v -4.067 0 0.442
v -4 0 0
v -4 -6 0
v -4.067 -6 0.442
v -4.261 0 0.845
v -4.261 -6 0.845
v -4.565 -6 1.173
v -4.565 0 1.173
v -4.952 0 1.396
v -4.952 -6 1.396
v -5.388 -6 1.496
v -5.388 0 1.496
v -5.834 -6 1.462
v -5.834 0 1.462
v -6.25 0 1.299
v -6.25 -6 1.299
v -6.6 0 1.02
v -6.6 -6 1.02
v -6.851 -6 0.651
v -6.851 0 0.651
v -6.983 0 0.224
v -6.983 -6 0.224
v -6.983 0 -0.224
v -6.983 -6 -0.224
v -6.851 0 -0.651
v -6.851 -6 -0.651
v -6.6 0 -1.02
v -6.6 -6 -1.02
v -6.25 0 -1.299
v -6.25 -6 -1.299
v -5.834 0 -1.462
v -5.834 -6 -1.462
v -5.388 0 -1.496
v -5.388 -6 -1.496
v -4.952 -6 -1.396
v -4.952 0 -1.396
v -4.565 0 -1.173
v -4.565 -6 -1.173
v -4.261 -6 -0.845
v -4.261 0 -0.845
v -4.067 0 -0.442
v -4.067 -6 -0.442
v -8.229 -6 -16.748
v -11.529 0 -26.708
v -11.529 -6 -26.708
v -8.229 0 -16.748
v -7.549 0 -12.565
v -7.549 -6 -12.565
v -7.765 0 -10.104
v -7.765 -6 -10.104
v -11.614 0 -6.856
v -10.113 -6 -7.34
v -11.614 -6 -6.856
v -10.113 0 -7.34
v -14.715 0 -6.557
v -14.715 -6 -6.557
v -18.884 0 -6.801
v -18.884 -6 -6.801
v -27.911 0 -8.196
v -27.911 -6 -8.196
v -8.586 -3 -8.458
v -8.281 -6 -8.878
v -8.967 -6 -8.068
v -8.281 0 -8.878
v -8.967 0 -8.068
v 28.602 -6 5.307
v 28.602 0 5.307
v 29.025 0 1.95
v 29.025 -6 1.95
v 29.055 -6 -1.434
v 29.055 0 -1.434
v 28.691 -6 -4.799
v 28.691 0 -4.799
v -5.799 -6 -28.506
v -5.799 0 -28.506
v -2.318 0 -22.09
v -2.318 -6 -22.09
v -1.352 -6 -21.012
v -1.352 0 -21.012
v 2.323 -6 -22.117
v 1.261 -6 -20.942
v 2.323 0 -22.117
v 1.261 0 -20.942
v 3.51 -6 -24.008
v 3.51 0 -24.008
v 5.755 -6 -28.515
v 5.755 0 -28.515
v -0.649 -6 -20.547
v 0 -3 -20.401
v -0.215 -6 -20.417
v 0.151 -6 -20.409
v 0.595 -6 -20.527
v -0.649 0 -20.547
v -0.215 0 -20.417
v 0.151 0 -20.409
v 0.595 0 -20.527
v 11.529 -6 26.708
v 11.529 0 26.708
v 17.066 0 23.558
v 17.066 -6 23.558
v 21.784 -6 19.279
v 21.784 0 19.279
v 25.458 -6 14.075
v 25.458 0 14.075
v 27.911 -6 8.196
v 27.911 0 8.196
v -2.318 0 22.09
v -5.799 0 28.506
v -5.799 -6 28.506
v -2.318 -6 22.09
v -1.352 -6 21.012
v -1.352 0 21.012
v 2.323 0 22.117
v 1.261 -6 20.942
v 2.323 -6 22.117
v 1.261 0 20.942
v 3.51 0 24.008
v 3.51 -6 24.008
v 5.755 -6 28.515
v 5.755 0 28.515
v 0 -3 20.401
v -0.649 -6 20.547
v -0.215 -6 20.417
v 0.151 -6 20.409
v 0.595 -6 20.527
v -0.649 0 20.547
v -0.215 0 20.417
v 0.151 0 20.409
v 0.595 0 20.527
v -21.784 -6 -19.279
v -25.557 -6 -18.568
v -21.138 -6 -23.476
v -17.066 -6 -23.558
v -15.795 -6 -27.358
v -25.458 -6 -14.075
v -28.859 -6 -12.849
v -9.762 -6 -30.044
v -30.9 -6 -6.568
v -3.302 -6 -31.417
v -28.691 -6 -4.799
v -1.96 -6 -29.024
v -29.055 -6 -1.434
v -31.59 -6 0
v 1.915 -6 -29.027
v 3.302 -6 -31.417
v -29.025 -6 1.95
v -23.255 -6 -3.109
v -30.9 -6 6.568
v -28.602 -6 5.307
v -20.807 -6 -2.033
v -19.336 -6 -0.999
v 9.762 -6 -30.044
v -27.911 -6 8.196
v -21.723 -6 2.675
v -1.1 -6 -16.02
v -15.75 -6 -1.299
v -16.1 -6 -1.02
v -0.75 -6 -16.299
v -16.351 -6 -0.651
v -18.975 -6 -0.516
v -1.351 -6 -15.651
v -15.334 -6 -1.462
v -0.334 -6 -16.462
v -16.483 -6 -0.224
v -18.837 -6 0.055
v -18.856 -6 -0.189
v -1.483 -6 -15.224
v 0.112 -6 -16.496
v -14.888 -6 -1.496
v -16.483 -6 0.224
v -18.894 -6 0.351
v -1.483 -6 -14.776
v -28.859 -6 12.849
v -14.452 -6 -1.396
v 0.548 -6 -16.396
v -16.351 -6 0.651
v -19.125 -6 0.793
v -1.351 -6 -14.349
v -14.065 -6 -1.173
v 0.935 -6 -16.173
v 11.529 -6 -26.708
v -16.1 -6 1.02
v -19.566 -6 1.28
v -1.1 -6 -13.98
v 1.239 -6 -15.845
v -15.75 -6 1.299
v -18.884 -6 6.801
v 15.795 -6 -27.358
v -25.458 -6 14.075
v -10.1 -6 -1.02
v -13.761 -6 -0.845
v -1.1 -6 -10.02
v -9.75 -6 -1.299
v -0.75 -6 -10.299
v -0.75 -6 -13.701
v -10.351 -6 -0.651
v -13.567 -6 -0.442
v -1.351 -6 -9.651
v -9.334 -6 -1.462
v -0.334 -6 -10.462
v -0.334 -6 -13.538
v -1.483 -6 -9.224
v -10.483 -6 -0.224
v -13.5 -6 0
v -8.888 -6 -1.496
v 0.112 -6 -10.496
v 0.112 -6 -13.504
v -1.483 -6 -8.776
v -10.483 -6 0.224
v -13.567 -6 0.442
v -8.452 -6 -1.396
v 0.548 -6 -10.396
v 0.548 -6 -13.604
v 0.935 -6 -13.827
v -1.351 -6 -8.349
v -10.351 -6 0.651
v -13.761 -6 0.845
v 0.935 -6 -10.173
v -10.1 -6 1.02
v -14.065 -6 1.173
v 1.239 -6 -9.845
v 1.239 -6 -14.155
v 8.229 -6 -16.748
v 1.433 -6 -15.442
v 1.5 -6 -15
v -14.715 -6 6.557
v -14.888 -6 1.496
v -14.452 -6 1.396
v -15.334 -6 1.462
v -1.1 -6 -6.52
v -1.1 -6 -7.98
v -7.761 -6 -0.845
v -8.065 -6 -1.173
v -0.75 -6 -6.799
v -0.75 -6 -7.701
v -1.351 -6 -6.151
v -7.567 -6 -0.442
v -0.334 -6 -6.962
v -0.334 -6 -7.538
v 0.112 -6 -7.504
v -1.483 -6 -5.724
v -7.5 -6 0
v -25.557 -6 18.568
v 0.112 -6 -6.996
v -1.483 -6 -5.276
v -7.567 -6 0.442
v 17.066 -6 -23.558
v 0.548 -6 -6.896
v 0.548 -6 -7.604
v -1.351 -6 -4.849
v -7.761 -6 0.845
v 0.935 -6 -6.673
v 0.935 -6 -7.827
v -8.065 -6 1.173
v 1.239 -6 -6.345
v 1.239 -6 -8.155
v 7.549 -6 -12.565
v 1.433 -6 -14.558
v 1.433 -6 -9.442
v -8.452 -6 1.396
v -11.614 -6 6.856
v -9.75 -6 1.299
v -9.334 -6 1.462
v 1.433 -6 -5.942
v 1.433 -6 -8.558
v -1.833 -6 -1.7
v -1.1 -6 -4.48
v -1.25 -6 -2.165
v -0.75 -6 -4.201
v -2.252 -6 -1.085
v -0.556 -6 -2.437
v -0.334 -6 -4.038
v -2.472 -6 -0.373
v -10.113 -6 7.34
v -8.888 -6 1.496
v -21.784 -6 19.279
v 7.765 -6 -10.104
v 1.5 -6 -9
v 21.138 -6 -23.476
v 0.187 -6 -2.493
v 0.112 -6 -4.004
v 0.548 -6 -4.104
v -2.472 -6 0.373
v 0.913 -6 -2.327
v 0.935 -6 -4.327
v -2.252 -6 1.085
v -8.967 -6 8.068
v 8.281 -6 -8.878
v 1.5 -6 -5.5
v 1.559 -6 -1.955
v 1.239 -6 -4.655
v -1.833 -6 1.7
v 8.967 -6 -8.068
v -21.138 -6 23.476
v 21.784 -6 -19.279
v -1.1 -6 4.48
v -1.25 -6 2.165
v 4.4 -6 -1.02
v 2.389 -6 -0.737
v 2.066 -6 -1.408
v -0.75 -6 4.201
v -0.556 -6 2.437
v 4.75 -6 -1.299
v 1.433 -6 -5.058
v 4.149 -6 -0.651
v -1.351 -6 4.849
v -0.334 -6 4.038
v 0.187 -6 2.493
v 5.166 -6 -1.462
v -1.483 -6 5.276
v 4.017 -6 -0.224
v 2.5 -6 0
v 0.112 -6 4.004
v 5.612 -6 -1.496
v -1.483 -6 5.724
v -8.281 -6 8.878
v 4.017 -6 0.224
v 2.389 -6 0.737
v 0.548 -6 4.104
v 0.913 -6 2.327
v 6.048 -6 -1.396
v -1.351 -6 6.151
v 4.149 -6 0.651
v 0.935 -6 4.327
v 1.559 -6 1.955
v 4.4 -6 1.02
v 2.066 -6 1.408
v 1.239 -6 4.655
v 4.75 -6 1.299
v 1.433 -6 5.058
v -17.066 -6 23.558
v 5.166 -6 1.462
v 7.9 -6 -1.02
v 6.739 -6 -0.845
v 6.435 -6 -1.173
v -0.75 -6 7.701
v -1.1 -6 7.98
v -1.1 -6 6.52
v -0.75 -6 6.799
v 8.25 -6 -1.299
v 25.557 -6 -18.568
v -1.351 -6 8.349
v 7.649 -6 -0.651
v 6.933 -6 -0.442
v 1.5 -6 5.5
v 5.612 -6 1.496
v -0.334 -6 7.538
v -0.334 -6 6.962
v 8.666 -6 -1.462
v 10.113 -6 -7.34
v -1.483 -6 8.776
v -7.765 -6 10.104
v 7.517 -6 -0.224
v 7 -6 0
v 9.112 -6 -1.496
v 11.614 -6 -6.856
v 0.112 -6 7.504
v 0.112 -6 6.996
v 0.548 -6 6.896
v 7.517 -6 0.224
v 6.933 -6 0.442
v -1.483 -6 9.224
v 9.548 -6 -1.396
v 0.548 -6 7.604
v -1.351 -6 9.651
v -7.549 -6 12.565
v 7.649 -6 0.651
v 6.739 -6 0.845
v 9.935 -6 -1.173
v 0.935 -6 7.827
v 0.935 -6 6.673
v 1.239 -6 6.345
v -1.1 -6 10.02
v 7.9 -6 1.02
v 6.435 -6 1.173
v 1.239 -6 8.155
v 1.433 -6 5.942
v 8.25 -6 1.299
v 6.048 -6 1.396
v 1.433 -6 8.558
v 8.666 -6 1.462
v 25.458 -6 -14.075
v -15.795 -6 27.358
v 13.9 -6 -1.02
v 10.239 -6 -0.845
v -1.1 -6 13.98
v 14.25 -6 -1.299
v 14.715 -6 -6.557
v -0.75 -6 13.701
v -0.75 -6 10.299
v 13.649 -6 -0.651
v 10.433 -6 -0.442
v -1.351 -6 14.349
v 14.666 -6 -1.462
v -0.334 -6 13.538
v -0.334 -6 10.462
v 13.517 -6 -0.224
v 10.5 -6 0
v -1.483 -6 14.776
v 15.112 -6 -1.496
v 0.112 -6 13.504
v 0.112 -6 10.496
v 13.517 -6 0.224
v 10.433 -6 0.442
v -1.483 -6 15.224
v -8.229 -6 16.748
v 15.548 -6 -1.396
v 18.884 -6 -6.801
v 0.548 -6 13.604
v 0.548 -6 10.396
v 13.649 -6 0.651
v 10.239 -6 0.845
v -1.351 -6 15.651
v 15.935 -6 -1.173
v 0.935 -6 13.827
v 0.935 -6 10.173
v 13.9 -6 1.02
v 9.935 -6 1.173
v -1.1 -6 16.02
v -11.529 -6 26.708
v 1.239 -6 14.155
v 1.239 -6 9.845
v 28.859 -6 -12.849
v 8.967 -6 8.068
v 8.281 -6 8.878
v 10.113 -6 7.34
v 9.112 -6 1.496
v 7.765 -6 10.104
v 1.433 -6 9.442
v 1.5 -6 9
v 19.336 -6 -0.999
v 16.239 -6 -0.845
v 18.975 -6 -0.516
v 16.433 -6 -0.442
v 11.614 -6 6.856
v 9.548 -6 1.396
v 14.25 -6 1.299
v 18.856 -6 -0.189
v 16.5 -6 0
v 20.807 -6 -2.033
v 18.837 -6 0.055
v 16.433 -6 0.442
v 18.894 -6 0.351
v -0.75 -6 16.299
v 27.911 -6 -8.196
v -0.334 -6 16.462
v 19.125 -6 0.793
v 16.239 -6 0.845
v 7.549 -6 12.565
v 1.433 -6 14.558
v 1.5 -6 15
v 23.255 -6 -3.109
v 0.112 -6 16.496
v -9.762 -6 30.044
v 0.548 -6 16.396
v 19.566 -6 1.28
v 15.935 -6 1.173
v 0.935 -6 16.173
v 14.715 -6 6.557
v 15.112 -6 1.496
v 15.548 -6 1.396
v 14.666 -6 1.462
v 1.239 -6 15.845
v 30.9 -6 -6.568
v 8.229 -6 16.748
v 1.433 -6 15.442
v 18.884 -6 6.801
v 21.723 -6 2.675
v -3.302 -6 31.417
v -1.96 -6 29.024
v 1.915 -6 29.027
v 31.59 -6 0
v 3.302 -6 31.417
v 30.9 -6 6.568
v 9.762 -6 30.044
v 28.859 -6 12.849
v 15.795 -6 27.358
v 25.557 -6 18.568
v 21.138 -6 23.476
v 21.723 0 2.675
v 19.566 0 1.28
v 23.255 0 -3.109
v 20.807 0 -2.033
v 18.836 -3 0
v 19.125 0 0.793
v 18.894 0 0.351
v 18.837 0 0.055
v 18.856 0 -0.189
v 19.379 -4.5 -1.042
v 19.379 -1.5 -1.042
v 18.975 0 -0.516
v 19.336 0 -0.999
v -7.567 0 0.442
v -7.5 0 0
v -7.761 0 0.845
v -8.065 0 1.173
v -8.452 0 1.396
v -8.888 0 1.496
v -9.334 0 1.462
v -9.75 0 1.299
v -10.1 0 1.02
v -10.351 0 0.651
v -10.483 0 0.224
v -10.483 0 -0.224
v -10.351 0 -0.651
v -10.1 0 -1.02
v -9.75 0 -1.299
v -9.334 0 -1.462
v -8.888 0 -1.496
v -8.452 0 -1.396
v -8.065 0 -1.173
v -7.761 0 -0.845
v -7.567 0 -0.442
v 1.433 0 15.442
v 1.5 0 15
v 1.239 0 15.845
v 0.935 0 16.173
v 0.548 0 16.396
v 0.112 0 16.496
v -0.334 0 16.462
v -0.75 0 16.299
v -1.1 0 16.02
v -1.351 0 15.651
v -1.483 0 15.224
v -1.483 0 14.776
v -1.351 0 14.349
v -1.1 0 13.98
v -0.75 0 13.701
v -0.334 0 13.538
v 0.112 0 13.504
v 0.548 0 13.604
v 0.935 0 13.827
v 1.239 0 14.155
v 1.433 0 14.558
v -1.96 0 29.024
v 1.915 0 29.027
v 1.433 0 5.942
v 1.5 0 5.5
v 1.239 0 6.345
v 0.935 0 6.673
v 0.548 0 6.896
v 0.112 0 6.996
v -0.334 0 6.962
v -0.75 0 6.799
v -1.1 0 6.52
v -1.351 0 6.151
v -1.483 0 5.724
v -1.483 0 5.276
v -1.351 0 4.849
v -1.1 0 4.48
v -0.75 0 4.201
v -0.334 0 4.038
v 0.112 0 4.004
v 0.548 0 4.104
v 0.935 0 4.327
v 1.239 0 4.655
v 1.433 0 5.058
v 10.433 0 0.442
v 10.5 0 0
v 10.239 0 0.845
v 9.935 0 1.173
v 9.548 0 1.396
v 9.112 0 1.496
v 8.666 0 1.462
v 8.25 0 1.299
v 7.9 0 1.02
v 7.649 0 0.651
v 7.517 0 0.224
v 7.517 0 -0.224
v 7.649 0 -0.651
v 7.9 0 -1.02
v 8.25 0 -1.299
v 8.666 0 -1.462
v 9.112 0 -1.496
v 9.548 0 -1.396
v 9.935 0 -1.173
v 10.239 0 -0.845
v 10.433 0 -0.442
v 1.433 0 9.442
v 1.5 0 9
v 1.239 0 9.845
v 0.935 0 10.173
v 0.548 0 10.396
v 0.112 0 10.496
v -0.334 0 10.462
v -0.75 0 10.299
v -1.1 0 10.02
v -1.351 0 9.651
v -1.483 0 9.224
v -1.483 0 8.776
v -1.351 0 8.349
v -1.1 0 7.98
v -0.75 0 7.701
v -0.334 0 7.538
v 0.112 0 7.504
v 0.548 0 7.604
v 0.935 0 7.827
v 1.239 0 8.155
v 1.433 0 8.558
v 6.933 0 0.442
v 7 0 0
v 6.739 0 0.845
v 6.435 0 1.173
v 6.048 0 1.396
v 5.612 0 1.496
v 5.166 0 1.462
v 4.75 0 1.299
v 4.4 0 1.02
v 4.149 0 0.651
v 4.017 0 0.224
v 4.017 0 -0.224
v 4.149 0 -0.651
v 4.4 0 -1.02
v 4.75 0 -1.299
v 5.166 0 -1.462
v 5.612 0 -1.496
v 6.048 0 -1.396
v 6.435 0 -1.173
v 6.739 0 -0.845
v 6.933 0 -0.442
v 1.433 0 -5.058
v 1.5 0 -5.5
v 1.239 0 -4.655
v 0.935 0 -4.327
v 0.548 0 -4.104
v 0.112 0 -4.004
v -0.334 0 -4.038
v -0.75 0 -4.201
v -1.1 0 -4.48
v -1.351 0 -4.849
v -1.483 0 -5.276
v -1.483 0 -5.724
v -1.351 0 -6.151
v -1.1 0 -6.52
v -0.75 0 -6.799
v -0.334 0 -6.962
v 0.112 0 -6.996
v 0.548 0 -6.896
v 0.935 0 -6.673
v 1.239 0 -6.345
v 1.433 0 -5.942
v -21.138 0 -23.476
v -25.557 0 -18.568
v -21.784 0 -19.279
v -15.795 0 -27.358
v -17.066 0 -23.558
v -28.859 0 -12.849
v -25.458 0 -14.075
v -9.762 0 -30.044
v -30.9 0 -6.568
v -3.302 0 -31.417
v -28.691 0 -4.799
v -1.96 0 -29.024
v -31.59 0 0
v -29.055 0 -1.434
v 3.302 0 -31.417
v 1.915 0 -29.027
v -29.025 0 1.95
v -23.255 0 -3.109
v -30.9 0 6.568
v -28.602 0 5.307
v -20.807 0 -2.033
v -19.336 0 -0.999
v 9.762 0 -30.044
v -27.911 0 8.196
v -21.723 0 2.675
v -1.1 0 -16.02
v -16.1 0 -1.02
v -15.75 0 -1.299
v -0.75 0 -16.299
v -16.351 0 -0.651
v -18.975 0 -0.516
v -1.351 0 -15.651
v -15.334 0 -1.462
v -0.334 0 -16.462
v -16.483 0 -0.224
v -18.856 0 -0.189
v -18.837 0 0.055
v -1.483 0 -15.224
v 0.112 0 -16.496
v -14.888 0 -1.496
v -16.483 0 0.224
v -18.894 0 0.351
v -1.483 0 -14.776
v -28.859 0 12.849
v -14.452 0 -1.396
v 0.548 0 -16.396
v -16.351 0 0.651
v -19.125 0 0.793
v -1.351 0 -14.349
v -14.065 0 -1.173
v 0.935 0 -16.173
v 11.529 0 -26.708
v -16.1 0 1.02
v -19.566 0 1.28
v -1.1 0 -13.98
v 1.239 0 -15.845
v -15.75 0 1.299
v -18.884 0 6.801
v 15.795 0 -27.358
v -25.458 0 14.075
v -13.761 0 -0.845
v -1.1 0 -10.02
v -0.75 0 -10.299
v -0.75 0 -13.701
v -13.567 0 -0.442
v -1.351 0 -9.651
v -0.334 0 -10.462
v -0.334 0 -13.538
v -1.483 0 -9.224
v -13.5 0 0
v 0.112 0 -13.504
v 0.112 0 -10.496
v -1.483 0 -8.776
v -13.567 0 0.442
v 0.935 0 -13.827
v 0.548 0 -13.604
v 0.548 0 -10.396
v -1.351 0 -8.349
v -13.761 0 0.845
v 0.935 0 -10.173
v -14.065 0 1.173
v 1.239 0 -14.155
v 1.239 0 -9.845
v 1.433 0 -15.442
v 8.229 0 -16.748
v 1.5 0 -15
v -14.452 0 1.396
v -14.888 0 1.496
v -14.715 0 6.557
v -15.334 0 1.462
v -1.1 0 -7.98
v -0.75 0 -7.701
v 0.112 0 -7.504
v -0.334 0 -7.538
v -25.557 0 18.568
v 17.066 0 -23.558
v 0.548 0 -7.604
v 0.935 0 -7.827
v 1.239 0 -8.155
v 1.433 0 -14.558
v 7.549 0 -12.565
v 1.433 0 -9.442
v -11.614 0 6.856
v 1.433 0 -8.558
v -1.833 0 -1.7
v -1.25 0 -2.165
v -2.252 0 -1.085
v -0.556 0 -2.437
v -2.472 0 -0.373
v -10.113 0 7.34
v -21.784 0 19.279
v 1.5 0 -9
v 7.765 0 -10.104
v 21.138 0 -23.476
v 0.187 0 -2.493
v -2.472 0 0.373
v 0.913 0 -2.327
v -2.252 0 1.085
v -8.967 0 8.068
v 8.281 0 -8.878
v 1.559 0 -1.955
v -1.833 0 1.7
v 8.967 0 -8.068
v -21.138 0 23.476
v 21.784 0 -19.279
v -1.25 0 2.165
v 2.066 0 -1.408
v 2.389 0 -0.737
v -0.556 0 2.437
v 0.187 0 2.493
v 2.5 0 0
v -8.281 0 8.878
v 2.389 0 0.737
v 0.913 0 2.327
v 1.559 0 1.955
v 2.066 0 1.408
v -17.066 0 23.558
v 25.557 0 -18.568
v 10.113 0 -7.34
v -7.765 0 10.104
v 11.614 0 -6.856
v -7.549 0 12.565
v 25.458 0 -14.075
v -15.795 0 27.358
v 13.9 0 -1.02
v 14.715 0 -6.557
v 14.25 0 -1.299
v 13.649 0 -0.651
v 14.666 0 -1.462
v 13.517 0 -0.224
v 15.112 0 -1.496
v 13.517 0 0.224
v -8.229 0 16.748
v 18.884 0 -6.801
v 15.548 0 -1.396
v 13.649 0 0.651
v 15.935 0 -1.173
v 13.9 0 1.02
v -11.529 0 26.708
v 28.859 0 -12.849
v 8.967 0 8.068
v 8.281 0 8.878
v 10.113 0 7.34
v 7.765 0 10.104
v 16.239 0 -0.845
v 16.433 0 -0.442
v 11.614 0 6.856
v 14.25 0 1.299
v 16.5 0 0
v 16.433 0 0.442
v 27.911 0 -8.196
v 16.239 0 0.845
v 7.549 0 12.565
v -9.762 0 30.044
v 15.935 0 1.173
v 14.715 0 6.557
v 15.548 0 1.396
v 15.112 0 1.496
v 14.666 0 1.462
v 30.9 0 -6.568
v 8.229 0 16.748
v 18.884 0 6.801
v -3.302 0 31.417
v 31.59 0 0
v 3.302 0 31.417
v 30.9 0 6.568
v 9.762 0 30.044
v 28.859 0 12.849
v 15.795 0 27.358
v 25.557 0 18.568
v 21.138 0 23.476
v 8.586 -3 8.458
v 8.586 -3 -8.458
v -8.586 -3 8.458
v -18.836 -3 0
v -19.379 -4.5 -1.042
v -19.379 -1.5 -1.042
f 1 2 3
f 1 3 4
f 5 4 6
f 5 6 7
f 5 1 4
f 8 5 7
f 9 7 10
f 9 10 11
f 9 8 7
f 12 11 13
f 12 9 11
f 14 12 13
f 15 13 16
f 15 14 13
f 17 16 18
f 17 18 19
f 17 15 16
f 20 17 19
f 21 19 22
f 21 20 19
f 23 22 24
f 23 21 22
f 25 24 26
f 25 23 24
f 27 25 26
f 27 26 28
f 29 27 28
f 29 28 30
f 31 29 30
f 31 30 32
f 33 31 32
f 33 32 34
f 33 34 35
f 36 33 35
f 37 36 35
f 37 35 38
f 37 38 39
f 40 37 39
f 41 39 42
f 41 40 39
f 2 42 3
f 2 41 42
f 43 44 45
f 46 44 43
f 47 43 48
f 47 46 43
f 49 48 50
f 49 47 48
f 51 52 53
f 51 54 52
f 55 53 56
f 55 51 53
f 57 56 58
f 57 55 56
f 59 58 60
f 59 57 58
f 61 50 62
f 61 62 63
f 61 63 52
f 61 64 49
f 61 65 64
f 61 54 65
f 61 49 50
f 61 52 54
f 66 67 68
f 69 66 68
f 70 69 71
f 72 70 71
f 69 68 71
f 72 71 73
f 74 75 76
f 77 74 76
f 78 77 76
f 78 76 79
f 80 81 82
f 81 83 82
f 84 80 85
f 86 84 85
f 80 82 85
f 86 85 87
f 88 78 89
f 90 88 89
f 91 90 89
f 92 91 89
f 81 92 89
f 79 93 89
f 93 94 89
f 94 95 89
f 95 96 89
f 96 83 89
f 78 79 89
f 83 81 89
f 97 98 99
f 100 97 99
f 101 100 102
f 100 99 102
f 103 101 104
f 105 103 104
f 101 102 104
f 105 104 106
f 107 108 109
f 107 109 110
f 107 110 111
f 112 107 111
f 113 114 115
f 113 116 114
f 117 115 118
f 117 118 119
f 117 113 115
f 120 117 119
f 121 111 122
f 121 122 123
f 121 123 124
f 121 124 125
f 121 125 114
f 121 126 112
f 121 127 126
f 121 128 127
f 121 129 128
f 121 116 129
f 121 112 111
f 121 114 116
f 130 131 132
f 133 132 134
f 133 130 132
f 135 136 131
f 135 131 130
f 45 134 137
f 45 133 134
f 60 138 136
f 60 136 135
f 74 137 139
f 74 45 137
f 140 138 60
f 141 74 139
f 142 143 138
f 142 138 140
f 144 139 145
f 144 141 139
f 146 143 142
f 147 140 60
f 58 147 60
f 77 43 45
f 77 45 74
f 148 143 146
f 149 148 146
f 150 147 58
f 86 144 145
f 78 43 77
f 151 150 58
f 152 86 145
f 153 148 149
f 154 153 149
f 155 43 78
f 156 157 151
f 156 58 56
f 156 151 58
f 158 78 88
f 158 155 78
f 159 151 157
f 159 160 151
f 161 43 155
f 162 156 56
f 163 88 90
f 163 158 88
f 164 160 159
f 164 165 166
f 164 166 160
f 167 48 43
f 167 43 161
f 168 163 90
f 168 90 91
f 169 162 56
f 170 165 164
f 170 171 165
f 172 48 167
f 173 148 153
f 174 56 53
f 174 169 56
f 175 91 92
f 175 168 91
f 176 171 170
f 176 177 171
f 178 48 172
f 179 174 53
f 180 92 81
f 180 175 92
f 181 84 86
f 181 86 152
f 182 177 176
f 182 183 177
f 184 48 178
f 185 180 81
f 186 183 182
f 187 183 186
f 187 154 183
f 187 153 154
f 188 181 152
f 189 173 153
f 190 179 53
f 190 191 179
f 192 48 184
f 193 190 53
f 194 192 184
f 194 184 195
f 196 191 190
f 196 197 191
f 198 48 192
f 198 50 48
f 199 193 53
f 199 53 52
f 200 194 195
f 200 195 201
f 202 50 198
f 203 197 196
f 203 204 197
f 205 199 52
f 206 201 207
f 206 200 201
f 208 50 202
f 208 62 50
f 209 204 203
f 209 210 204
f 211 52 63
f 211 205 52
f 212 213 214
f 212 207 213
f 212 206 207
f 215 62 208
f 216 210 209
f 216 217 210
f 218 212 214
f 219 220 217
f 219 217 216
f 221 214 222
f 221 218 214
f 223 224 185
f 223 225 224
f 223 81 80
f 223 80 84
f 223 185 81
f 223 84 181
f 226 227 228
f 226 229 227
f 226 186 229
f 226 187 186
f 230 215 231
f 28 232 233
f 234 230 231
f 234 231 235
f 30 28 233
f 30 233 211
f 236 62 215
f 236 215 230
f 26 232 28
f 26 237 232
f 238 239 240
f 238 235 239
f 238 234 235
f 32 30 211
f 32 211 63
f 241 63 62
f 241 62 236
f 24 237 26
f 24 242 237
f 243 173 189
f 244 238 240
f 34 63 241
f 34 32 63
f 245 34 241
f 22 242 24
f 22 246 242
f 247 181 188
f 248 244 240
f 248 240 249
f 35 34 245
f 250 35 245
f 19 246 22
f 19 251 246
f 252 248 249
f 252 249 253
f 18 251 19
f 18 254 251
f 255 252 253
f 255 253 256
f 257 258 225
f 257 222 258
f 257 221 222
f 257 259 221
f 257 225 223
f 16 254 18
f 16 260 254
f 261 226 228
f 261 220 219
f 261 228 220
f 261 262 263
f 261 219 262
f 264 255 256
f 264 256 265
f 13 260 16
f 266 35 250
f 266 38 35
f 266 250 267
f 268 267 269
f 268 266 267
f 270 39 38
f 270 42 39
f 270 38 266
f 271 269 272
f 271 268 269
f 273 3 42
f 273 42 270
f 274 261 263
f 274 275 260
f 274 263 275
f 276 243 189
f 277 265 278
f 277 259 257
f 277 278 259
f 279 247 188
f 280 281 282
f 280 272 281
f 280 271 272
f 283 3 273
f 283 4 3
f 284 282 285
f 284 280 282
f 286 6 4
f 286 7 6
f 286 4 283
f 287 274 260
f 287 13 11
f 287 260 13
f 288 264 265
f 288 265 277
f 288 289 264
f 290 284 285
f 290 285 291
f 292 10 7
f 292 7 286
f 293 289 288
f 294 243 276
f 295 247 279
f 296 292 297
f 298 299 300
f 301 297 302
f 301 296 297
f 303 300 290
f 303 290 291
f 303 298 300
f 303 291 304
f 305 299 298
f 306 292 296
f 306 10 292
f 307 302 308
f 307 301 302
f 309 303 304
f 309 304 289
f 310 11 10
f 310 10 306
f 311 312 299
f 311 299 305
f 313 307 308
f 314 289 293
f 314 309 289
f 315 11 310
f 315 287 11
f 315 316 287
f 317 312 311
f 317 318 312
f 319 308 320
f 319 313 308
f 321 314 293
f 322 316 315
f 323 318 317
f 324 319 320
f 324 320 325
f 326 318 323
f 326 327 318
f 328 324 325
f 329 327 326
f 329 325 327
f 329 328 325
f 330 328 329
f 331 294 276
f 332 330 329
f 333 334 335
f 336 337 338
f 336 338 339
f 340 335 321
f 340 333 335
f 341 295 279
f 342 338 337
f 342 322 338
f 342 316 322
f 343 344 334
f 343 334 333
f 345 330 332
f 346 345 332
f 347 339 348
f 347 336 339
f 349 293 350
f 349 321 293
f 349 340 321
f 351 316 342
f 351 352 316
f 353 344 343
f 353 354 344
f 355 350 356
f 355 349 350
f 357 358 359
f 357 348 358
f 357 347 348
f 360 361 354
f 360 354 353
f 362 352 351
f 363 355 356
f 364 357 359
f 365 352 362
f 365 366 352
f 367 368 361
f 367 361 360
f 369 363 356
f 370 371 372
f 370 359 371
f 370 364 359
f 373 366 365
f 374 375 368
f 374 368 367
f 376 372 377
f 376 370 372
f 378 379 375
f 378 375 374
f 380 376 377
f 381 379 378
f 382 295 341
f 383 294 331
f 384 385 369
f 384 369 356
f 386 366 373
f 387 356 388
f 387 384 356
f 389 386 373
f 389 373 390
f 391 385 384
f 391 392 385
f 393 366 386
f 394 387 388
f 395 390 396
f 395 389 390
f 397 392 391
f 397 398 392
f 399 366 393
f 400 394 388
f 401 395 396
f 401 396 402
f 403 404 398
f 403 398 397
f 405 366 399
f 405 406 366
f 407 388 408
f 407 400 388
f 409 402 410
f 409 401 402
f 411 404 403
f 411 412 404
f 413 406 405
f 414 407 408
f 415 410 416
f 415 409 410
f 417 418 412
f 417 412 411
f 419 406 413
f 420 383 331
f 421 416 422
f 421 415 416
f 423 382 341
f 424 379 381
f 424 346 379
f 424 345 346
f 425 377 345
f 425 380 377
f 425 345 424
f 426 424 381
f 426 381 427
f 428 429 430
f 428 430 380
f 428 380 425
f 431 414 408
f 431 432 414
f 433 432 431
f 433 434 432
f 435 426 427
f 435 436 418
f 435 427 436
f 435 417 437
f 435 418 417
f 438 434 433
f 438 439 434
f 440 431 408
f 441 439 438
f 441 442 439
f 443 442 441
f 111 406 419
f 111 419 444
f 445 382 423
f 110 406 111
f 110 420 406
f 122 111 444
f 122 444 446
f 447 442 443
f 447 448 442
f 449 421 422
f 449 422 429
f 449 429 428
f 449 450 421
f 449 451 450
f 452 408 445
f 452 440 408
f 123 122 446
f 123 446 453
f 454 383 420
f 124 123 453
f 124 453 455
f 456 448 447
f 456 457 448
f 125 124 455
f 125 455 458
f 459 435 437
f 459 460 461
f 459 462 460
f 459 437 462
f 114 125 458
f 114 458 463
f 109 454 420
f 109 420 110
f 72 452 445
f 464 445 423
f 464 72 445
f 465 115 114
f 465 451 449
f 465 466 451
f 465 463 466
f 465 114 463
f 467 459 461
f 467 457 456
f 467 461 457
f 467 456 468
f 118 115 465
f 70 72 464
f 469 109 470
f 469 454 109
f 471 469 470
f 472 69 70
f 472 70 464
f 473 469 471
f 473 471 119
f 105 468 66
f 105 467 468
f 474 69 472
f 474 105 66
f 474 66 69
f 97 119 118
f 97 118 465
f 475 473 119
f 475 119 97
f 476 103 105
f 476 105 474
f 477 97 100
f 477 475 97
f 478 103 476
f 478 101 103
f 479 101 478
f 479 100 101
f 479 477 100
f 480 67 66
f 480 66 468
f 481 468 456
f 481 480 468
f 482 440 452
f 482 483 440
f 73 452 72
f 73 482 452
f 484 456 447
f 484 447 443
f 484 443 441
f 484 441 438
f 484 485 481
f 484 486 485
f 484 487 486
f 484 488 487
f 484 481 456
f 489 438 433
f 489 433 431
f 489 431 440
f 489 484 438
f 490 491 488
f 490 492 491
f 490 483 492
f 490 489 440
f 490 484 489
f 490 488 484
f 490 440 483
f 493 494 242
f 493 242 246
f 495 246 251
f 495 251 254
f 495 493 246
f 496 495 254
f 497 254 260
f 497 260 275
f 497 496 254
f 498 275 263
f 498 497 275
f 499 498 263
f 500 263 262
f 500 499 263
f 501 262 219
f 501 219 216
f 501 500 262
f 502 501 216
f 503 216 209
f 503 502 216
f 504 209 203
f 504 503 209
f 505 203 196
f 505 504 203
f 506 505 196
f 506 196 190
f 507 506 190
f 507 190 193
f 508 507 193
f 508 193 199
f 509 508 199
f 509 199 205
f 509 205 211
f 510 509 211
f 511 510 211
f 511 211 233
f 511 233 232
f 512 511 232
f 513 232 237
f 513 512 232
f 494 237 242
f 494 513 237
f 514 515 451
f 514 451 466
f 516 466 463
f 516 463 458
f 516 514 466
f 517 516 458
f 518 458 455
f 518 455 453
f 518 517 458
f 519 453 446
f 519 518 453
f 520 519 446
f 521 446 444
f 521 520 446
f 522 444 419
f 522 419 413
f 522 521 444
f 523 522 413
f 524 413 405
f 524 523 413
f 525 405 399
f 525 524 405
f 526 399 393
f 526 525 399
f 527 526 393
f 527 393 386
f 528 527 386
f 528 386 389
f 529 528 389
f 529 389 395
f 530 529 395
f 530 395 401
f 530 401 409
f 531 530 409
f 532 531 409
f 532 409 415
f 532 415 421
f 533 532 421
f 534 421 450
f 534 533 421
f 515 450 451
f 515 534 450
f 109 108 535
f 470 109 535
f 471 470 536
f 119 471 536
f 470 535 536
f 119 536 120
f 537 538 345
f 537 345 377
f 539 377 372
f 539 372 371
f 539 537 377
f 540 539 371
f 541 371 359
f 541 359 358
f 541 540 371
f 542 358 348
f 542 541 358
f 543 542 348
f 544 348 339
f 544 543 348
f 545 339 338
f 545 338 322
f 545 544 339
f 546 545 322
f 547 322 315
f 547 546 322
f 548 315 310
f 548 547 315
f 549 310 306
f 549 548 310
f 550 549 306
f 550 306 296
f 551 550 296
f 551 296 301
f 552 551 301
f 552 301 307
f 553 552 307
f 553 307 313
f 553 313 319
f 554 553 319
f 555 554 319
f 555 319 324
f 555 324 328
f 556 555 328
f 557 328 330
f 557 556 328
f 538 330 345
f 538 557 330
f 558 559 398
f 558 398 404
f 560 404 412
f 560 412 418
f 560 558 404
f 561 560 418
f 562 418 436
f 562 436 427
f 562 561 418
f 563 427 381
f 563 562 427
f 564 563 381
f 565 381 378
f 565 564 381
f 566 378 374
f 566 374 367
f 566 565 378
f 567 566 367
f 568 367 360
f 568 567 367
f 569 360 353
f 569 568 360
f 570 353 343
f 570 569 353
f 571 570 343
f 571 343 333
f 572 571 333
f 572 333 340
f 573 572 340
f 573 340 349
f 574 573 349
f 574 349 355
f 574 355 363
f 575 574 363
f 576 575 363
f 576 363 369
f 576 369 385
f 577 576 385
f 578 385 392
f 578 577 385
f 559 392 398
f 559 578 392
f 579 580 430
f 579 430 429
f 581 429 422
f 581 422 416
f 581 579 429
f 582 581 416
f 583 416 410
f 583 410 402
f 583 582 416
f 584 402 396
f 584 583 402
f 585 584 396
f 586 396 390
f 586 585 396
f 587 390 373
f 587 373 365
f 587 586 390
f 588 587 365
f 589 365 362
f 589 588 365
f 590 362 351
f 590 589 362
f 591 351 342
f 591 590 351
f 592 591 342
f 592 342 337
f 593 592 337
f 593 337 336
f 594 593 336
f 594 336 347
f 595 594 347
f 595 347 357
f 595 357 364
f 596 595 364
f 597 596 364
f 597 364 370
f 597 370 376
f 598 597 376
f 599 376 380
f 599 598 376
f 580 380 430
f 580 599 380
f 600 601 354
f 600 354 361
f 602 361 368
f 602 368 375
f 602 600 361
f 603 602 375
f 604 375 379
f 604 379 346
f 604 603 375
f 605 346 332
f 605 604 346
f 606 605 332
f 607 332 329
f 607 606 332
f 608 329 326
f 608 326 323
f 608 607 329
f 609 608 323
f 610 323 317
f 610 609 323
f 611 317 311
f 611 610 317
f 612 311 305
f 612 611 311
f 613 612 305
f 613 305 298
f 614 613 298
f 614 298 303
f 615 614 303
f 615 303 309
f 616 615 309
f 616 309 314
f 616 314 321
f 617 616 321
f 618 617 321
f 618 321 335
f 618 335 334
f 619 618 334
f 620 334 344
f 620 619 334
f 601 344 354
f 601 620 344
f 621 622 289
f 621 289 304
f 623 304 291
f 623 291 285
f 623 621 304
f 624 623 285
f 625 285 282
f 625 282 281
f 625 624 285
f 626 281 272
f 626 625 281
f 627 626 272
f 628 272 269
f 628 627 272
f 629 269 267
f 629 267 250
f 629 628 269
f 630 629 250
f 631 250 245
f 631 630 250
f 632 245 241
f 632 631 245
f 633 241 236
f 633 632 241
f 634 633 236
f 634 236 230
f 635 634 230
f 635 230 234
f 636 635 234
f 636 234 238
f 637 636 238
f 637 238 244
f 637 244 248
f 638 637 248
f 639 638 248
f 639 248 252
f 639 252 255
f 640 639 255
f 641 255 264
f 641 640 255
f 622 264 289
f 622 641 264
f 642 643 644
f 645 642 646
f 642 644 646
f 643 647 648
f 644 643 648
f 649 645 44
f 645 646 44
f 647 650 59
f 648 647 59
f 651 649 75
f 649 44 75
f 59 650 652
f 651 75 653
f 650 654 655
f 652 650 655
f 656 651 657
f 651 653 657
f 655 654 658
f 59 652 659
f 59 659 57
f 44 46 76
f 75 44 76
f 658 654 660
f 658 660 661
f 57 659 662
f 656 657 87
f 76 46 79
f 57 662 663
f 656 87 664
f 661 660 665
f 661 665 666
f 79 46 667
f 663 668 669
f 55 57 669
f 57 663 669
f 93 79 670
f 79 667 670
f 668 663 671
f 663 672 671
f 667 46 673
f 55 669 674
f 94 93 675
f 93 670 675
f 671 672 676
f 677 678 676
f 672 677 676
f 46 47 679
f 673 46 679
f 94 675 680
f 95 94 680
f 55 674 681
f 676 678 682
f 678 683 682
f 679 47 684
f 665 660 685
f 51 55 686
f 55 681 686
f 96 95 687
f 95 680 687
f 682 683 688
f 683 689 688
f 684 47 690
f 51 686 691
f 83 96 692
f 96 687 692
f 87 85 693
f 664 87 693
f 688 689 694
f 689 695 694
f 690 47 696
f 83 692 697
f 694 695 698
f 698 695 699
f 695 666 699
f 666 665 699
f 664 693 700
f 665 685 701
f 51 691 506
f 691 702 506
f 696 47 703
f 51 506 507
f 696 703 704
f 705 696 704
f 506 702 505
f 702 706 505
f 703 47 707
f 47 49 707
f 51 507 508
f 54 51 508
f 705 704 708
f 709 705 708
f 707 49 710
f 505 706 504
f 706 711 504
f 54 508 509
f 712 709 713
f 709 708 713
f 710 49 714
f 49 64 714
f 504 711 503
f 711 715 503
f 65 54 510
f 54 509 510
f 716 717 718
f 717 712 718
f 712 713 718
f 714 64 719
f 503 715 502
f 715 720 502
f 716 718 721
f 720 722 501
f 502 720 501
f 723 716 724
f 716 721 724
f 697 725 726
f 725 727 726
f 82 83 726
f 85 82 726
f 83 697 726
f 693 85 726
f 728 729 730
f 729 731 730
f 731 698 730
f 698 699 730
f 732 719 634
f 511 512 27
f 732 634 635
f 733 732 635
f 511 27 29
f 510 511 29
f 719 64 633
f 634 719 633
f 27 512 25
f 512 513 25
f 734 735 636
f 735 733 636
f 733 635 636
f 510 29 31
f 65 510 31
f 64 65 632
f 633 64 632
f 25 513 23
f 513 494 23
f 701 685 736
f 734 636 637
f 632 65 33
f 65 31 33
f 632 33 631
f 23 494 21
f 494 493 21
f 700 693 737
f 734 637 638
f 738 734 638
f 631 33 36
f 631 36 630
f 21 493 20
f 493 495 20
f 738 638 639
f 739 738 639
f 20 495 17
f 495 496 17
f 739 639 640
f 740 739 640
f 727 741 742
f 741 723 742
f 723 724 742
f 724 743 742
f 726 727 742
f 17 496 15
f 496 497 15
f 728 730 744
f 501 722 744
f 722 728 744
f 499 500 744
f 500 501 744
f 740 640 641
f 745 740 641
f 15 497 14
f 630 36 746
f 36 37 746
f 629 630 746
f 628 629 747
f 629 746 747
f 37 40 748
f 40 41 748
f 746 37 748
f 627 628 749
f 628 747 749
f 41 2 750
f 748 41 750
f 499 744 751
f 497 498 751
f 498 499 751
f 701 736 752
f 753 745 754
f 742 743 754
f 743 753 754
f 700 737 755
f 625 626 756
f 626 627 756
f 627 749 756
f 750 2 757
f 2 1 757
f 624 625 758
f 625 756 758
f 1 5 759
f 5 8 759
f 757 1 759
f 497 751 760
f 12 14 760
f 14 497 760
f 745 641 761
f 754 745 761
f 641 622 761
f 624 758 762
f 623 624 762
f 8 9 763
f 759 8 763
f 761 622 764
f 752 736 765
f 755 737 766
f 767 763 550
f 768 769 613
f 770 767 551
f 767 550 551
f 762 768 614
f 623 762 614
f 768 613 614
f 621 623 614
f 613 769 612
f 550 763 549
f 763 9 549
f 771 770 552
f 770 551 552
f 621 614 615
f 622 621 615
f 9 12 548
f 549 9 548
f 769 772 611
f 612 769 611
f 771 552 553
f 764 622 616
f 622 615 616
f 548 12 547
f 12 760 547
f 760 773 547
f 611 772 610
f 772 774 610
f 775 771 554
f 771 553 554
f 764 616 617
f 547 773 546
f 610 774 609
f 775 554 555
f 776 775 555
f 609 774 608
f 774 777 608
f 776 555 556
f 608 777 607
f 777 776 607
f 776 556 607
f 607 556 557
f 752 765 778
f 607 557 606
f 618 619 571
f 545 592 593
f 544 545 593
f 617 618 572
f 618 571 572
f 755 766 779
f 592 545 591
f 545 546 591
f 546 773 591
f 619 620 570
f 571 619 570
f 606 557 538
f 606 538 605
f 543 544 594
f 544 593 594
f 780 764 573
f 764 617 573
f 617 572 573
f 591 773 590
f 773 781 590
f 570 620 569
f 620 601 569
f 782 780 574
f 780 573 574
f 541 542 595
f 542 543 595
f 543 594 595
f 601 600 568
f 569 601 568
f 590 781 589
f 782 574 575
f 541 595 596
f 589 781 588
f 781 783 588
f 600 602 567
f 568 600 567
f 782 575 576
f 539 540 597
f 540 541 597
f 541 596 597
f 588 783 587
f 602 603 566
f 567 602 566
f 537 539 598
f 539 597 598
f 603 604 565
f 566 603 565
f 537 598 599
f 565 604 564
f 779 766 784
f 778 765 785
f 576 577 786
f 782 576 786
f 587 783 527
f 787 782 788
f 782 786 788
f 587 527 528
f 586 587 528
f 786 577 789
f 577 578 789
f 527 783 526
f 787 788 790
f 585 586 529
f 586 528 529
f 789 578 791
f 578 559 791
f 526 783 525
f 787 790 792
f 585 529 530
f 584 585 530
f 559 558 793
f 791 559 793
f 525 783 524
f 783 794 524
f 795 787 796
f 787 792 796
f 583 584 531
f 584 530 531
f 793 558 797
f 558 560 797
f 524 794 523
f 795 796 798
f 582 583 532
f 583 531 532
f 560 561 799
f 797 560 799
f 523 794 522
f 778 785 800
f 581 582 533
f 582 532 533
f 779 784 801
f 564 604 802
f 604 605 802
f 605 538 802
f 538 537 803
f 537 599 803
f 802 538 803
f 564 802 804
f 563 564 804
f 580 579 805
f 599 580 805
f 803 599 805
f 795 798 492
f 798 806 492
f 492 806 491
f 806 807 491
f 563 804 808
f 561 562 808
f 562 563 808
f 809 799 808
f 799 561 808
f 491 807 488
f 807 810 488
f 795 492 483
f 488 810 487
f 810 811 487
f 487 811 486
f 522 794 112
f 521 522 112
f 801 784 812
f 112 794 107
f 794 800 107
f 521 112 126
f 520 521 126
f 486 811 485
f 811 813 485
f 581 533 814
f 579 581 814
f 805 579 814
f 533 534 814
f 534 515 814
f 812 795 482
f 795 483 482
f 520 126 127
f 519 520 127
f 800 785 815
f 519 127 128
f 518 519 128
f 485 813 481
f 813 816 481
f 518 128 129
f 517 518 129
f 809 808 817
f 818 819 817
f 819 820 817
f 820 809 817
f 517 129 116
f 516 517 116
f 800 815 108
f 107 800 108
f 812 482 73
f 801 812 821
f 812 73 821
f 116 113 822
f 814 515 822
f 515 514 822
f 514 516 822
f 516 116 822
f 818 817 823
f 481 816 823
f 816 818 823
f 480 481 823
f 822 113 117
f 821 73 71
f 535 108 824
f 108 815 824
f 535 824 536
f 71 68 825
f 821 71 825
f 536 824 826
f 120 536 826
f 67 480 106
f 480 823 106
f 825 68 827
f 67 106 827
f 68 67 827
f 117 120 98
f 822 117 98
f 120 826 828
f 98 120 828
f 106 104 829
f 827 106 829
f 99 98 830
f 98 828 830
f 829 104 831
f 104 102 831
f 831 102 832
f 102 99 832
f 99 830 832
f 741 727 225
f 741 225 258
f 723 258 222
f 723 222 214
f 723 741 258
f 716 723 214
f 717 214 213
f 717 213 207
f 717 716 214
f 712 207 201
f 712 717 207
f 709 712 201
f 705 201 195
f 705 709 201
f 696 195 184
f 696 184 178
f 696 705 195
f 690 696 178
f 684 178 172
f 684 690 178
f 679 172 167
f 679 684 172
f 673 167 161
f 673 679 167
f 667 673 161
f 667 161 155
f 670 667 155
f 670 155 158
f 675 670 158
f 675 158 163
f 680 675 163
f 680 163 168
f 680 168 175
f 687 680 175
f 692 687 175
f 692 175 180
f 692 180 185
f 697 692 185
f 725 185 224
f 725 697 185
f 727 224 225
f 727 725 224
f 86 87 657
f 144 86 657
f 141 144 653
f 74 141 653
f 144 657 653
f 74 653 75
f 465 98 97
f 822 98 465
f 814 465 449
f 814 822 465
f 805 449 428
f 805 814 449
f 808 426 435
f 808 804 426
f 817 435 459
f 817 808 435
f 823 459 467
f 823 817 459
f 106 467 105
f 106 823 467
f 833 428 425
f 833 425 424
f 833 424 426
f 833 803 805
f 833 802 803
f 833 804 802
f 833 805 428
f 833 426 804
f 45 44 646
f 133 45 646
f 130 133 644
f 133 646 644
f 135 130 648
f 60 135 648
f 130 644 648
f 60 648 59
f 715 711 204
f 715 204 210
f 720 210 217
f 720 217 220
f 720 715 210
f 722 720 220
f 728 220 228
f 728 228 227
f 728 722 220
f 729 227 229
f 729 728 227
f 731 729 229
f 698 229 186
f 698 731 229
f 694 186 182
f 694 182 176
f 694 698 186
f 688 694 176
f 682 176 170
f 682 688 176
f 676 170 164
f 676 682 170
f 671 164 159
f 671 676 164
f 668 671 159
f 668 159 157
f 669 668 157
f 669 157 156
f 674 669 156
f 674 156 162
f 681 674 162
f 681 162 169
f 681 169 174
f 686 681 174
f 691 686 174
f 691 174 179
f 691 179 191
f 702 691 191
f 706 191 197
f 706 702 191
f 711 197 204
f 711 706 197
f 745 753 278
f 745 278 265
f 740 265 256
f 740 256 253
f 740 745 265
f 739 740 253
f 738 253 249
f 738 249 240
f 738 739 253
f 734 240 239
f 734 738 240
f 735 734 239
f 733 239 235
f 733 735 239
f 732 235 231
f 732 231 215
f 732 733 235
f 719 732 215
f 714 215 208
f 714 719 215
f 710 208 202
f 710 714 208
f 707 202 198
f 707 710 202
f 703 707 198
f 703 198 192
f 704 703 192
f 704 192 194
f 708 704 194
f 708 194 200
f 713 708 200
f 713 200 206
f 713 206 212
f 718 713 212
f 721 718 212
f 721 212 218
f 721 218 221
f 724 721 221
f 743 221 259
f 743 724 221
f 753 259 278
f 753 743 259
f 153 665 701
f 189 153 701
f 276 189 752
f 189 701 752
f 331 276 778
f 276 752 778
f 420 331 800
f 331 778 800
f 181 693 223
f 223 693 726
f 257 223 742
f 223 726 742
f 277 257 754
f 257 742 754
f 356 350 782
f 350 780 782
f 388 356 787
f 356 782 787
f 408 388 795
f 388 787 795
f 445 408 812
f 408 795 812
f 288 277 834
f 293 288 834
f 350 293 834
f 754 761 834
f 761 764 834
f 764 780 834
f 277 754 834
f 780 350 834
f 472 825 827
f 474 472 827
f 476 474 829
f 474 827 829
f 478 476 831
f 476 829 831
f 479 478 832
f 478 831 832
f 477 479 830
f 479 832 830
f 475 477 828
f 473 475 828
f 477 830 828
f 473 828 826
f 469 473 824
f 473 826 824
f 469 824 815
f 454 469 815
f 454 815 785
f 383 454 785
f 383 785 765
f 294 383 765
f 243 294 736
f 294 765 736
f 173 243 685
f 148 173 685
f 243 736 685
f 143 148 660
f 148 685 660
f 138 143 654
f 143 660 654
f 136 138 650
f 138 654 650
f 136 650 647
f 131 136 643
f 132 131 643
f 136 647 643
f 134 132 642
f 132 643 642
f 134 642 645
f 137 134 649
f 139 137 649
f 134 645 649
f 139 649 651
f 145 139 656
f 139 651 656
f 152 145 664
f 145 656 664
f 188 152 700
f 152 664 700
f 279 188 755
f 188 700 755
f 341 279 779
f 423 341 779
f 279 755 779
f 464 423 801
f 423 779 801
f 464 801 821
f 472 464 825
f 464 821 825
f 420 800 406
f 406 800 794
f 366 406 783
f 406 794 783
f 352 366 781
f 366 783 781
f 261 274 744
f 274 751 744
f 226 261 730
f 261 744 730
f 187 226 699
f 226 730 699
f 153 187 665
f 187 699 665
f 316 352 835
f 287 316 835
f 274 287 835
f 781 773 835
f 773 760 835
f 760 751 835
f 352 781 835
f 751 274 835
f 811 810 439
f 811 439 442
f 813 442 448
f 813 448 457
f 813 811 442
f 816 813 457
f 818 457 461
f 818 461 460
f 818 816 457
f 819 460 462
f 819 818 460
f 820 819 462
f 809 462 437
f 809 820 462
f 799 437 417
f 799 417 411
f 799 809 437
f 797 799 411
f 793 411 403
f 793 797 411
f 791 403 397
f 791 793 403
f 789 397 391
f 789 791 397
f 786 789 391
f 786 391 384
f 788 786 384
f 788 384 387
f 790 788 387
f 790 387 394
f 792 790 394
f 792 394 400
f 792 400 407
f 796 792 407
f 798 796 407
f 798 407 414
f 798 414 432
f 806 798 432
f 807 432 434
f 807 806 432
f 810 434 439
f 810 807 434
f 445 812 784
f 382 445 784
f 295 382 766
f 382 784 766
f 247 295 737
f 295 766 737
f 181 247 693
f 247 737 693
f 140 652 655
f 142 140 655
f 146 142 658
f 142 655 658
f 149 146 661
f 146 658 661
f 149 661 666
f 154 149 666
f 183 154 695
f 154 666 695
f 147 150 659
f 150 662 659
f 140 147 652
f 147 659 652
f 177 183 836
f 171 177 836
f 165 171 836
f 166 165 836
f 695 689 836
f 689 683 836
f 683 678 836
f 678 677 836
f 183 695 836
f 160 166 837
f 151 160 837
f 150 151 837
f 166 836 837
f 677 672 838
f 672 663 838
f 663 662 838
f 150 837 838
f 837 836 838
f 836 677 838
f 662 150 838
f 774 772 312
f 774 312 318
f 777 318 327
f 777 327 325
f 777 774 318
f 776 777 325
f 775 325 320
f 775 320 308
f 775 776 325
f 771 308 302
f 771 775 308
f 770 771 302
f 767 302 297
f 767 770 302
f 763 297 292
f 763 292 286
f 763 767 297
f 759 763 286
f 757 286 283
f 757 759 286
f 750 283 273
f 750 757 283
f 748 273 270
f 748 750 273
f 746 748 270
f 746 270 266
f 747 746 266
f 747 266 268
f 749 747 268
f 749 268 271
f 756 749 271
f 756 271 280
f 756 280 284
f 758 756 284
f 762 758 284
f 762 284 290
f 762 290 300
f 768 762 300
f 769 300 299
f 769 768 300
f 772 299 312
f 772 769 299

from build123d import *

# Parameters (mm, degrees)
F0_R     = 31.59
F0_R_2   = 1.5
F0_R_3   = 2.5
F1_DEPTH = 6


with BuildPart() as f1:
    # F0 (on Front) → F1 (new body)
    with BuildSketch(Plane.XZ):
        Circle(F0_R)
        with BuildLine():
            ThreePointArc((5.7548407183, -28.5150821199), (-0.022576758, -29.0899912391), (-5.7990949004, -28.5061151042))
            add(Edge.make_bspline(
                [(-5.7990949004, -28.5061151042), (-3.8643270806, -24.4627677728), (0.007951806, -16.3346928963), (3.8413144045, -24.4710048156), (5.7548407183, -28.5150821199)],
                knots=[0, 0, 0, 0, 0.5002306451, 1, 1, 1, 1], degree=3))
        make_face(mode=Mode.SUBTRACT)
        with BuildLine():
            add(Edge.make_bspline(
                [(-11.5287328291, -26.7079841874), (-8.7534935922, -19.1514781576), (-3.1149871272, -3.8323867545), (-19.597387192, -6.7376991425), (-27.9114144594, -8.1964042651)],
                knots=[0, 0, 0, 0, 0.4944321997, 1, 1, 1, 1], degree=3))
            ThreePointArc((-11.5287328291, -26.7079841874), (-21.7841904219, -19.2789301483), (-27.9114144594, -8.1964042651))
        make_face(mode=Mode.SUBTRACT)
        with Locations((0, -15)):
            Circle(F0_R_2, mode=Mode.SUBTRACT)
        with Locations((0, -9)):
            Circle(F0_R_2, mode=Mode.SUBTRACT)
        with BuildLine():
            ThreePointArc((27.9114144594, -8.1964042651), (21.7841904219, -19.2789301483), (11.5287328291, -26.7079841874))
            add(Edge.make_bspline(
                [(11.5287328291, -26.7079841874), (8.7534935922, -19.1514781576), (3.1149871272, -3.8323867545), (19.597387192, -6.7376991425), (27.9114144594, -8.1964042651)],
                knots=[0, 0, 0, 0, 0.4944321997, 1, 1, 1, 1], degree=3))
        make_face(mode=Mode.SUBTRACT)
        with Locations((0, -5.5)):
            Circle(F0_R_2, mode=Mode.SUBTRACT)
        with BuildLine():
            ThreePointArc((-28.6914853437, -4.7986215489), (-29.0888528252, 0.2583434076), (-28.6017314519, 5.3074530573))
            add(Edge.make_bspline(
                [(-28.6017314519, 5.3074530573), (-24.4475826621, 4.0112175047), (-13.2248280378, -0.1559511272), (-24.4475826621, -3.6461949348), (-28.6914853437, -4.7986215489)],
                knots=[0, 0, 0, 0, 0.5017345436, 1, 1, 1, 1], degree=3))
        make_face(mode=Mode.SUBTRACT)
        with Locations((-15, 0)):
            Circle(F0_R_2, mode=Mode.SUBTRACT)
        with Locations((-9, 0)):
            Circle(F0_R_2, mode=Mode.SUBTRACT)
        with Locations((-5.5, 0)):
            Circle(F0_R_2, mode=Mode.SUBTRACT)
        with BuildLine():
            ThreePointArc((-27.9114144594, 8.1964042651), (-21.7841904219, 19.2789301483), (-11.5287328291, 26.7079841874))
            add(Edge.make_bspline(
                [(-11.5287328291, 26.7079841874), (-8.7534935922, 19.1514781576), (-3.1149871272, 3.8323867545), (-19.597387192, 6.7376991425), (-27.9114144594, 8.1964042651)],
                knots=[0, 0, 0, 0, 0.4944321997, 1, 1, 1, 1], degree=3))
        make_face(mode=Mode.SUBTRACT)
        with BuildLine():
            add(Edge.make_bspline(
                [(-5.7990949004, 28.5061151042), (-3.8643270806, 24.4627677728), (0.007951806, 16.3346928963), (3.8413144045, 24.4710048156), (5.7548407183, 28.5150821199)],
                knots=[0, 0, 0, 0, 0.5002306451, 1, 1, 1, 1], degree=3))
            ThreePointArc((-5.7990949004, 28.5061151042), (-0.022576758, 29.0899912391), (5.7548407183, 28.5150821199))
        make_face(mode=Mode.SUBTRACT)
        Circle(F0_R_3, mode=Mode.SUBTRACT)
        with Locations((5.5, 0)):
            Circle(F0_R_2, mode=Mode.SUBTRACT)
        with Locations((0, 5.5)):
            Circle(F0_R_2, mode=Mode.SUBTRACT)
        with Locations((9, 0)):
            Circle(F0_R_2, mode=Mode.SUBTRACT)
        with Locations((15, 0)):
            Circle(F0_R_2, mode=Mode.SUBTRACT)
        with Locations((0, 9)):
            Circle(F0_R_2, mode=Mode.SUBTRACT)
        with Locations((0, 15)):
            Circle(F0_R_2, mode=Mode.SUBTRACT)
        with BuildLine():
            add(Edge.make_bspline(
                [(11.5287328291, 26.7079841874), (8.7534935922, 19.1514781576), (3.1149871272, 3.8323867545), (19.597387192, 6.7376991425), (27.9114144594, 8.1964042651)],
                knots=[0, 0, 0, 0, 0.4944321997, 1, 1, 1, 1], degree=3))
            ThreePointArc((11.5287328291, 26.7079841874), (21.7841904219, 19.2789301483), (27.9114144594, 8.1964042651))
        make_face(mode=Mode.SUBTRACT)
        with BuildLine():
            add(Edge.make_bspline(
                [(28.6017314519, 5.3074530573), (24.4475826621, 4.0112175047), (13.2248280378, -0.1559511272), (24.4475826621, -3.6461949348), (28.6914853437, -4.7986215489)],
                knots=[0, 0, 0, 0, 0.5017345436, 1, 1, 1, 1], degree=3))
            ThreePointArc((28.6017314519, 5.3074530573), (29.0888528252, 0.2583434076), (28.6914853437, -4.7986215489))
        make_face(mode=Mode.SUBTRACT)
    extrude(amount=F1_DEPTH)


solid = f1.part
